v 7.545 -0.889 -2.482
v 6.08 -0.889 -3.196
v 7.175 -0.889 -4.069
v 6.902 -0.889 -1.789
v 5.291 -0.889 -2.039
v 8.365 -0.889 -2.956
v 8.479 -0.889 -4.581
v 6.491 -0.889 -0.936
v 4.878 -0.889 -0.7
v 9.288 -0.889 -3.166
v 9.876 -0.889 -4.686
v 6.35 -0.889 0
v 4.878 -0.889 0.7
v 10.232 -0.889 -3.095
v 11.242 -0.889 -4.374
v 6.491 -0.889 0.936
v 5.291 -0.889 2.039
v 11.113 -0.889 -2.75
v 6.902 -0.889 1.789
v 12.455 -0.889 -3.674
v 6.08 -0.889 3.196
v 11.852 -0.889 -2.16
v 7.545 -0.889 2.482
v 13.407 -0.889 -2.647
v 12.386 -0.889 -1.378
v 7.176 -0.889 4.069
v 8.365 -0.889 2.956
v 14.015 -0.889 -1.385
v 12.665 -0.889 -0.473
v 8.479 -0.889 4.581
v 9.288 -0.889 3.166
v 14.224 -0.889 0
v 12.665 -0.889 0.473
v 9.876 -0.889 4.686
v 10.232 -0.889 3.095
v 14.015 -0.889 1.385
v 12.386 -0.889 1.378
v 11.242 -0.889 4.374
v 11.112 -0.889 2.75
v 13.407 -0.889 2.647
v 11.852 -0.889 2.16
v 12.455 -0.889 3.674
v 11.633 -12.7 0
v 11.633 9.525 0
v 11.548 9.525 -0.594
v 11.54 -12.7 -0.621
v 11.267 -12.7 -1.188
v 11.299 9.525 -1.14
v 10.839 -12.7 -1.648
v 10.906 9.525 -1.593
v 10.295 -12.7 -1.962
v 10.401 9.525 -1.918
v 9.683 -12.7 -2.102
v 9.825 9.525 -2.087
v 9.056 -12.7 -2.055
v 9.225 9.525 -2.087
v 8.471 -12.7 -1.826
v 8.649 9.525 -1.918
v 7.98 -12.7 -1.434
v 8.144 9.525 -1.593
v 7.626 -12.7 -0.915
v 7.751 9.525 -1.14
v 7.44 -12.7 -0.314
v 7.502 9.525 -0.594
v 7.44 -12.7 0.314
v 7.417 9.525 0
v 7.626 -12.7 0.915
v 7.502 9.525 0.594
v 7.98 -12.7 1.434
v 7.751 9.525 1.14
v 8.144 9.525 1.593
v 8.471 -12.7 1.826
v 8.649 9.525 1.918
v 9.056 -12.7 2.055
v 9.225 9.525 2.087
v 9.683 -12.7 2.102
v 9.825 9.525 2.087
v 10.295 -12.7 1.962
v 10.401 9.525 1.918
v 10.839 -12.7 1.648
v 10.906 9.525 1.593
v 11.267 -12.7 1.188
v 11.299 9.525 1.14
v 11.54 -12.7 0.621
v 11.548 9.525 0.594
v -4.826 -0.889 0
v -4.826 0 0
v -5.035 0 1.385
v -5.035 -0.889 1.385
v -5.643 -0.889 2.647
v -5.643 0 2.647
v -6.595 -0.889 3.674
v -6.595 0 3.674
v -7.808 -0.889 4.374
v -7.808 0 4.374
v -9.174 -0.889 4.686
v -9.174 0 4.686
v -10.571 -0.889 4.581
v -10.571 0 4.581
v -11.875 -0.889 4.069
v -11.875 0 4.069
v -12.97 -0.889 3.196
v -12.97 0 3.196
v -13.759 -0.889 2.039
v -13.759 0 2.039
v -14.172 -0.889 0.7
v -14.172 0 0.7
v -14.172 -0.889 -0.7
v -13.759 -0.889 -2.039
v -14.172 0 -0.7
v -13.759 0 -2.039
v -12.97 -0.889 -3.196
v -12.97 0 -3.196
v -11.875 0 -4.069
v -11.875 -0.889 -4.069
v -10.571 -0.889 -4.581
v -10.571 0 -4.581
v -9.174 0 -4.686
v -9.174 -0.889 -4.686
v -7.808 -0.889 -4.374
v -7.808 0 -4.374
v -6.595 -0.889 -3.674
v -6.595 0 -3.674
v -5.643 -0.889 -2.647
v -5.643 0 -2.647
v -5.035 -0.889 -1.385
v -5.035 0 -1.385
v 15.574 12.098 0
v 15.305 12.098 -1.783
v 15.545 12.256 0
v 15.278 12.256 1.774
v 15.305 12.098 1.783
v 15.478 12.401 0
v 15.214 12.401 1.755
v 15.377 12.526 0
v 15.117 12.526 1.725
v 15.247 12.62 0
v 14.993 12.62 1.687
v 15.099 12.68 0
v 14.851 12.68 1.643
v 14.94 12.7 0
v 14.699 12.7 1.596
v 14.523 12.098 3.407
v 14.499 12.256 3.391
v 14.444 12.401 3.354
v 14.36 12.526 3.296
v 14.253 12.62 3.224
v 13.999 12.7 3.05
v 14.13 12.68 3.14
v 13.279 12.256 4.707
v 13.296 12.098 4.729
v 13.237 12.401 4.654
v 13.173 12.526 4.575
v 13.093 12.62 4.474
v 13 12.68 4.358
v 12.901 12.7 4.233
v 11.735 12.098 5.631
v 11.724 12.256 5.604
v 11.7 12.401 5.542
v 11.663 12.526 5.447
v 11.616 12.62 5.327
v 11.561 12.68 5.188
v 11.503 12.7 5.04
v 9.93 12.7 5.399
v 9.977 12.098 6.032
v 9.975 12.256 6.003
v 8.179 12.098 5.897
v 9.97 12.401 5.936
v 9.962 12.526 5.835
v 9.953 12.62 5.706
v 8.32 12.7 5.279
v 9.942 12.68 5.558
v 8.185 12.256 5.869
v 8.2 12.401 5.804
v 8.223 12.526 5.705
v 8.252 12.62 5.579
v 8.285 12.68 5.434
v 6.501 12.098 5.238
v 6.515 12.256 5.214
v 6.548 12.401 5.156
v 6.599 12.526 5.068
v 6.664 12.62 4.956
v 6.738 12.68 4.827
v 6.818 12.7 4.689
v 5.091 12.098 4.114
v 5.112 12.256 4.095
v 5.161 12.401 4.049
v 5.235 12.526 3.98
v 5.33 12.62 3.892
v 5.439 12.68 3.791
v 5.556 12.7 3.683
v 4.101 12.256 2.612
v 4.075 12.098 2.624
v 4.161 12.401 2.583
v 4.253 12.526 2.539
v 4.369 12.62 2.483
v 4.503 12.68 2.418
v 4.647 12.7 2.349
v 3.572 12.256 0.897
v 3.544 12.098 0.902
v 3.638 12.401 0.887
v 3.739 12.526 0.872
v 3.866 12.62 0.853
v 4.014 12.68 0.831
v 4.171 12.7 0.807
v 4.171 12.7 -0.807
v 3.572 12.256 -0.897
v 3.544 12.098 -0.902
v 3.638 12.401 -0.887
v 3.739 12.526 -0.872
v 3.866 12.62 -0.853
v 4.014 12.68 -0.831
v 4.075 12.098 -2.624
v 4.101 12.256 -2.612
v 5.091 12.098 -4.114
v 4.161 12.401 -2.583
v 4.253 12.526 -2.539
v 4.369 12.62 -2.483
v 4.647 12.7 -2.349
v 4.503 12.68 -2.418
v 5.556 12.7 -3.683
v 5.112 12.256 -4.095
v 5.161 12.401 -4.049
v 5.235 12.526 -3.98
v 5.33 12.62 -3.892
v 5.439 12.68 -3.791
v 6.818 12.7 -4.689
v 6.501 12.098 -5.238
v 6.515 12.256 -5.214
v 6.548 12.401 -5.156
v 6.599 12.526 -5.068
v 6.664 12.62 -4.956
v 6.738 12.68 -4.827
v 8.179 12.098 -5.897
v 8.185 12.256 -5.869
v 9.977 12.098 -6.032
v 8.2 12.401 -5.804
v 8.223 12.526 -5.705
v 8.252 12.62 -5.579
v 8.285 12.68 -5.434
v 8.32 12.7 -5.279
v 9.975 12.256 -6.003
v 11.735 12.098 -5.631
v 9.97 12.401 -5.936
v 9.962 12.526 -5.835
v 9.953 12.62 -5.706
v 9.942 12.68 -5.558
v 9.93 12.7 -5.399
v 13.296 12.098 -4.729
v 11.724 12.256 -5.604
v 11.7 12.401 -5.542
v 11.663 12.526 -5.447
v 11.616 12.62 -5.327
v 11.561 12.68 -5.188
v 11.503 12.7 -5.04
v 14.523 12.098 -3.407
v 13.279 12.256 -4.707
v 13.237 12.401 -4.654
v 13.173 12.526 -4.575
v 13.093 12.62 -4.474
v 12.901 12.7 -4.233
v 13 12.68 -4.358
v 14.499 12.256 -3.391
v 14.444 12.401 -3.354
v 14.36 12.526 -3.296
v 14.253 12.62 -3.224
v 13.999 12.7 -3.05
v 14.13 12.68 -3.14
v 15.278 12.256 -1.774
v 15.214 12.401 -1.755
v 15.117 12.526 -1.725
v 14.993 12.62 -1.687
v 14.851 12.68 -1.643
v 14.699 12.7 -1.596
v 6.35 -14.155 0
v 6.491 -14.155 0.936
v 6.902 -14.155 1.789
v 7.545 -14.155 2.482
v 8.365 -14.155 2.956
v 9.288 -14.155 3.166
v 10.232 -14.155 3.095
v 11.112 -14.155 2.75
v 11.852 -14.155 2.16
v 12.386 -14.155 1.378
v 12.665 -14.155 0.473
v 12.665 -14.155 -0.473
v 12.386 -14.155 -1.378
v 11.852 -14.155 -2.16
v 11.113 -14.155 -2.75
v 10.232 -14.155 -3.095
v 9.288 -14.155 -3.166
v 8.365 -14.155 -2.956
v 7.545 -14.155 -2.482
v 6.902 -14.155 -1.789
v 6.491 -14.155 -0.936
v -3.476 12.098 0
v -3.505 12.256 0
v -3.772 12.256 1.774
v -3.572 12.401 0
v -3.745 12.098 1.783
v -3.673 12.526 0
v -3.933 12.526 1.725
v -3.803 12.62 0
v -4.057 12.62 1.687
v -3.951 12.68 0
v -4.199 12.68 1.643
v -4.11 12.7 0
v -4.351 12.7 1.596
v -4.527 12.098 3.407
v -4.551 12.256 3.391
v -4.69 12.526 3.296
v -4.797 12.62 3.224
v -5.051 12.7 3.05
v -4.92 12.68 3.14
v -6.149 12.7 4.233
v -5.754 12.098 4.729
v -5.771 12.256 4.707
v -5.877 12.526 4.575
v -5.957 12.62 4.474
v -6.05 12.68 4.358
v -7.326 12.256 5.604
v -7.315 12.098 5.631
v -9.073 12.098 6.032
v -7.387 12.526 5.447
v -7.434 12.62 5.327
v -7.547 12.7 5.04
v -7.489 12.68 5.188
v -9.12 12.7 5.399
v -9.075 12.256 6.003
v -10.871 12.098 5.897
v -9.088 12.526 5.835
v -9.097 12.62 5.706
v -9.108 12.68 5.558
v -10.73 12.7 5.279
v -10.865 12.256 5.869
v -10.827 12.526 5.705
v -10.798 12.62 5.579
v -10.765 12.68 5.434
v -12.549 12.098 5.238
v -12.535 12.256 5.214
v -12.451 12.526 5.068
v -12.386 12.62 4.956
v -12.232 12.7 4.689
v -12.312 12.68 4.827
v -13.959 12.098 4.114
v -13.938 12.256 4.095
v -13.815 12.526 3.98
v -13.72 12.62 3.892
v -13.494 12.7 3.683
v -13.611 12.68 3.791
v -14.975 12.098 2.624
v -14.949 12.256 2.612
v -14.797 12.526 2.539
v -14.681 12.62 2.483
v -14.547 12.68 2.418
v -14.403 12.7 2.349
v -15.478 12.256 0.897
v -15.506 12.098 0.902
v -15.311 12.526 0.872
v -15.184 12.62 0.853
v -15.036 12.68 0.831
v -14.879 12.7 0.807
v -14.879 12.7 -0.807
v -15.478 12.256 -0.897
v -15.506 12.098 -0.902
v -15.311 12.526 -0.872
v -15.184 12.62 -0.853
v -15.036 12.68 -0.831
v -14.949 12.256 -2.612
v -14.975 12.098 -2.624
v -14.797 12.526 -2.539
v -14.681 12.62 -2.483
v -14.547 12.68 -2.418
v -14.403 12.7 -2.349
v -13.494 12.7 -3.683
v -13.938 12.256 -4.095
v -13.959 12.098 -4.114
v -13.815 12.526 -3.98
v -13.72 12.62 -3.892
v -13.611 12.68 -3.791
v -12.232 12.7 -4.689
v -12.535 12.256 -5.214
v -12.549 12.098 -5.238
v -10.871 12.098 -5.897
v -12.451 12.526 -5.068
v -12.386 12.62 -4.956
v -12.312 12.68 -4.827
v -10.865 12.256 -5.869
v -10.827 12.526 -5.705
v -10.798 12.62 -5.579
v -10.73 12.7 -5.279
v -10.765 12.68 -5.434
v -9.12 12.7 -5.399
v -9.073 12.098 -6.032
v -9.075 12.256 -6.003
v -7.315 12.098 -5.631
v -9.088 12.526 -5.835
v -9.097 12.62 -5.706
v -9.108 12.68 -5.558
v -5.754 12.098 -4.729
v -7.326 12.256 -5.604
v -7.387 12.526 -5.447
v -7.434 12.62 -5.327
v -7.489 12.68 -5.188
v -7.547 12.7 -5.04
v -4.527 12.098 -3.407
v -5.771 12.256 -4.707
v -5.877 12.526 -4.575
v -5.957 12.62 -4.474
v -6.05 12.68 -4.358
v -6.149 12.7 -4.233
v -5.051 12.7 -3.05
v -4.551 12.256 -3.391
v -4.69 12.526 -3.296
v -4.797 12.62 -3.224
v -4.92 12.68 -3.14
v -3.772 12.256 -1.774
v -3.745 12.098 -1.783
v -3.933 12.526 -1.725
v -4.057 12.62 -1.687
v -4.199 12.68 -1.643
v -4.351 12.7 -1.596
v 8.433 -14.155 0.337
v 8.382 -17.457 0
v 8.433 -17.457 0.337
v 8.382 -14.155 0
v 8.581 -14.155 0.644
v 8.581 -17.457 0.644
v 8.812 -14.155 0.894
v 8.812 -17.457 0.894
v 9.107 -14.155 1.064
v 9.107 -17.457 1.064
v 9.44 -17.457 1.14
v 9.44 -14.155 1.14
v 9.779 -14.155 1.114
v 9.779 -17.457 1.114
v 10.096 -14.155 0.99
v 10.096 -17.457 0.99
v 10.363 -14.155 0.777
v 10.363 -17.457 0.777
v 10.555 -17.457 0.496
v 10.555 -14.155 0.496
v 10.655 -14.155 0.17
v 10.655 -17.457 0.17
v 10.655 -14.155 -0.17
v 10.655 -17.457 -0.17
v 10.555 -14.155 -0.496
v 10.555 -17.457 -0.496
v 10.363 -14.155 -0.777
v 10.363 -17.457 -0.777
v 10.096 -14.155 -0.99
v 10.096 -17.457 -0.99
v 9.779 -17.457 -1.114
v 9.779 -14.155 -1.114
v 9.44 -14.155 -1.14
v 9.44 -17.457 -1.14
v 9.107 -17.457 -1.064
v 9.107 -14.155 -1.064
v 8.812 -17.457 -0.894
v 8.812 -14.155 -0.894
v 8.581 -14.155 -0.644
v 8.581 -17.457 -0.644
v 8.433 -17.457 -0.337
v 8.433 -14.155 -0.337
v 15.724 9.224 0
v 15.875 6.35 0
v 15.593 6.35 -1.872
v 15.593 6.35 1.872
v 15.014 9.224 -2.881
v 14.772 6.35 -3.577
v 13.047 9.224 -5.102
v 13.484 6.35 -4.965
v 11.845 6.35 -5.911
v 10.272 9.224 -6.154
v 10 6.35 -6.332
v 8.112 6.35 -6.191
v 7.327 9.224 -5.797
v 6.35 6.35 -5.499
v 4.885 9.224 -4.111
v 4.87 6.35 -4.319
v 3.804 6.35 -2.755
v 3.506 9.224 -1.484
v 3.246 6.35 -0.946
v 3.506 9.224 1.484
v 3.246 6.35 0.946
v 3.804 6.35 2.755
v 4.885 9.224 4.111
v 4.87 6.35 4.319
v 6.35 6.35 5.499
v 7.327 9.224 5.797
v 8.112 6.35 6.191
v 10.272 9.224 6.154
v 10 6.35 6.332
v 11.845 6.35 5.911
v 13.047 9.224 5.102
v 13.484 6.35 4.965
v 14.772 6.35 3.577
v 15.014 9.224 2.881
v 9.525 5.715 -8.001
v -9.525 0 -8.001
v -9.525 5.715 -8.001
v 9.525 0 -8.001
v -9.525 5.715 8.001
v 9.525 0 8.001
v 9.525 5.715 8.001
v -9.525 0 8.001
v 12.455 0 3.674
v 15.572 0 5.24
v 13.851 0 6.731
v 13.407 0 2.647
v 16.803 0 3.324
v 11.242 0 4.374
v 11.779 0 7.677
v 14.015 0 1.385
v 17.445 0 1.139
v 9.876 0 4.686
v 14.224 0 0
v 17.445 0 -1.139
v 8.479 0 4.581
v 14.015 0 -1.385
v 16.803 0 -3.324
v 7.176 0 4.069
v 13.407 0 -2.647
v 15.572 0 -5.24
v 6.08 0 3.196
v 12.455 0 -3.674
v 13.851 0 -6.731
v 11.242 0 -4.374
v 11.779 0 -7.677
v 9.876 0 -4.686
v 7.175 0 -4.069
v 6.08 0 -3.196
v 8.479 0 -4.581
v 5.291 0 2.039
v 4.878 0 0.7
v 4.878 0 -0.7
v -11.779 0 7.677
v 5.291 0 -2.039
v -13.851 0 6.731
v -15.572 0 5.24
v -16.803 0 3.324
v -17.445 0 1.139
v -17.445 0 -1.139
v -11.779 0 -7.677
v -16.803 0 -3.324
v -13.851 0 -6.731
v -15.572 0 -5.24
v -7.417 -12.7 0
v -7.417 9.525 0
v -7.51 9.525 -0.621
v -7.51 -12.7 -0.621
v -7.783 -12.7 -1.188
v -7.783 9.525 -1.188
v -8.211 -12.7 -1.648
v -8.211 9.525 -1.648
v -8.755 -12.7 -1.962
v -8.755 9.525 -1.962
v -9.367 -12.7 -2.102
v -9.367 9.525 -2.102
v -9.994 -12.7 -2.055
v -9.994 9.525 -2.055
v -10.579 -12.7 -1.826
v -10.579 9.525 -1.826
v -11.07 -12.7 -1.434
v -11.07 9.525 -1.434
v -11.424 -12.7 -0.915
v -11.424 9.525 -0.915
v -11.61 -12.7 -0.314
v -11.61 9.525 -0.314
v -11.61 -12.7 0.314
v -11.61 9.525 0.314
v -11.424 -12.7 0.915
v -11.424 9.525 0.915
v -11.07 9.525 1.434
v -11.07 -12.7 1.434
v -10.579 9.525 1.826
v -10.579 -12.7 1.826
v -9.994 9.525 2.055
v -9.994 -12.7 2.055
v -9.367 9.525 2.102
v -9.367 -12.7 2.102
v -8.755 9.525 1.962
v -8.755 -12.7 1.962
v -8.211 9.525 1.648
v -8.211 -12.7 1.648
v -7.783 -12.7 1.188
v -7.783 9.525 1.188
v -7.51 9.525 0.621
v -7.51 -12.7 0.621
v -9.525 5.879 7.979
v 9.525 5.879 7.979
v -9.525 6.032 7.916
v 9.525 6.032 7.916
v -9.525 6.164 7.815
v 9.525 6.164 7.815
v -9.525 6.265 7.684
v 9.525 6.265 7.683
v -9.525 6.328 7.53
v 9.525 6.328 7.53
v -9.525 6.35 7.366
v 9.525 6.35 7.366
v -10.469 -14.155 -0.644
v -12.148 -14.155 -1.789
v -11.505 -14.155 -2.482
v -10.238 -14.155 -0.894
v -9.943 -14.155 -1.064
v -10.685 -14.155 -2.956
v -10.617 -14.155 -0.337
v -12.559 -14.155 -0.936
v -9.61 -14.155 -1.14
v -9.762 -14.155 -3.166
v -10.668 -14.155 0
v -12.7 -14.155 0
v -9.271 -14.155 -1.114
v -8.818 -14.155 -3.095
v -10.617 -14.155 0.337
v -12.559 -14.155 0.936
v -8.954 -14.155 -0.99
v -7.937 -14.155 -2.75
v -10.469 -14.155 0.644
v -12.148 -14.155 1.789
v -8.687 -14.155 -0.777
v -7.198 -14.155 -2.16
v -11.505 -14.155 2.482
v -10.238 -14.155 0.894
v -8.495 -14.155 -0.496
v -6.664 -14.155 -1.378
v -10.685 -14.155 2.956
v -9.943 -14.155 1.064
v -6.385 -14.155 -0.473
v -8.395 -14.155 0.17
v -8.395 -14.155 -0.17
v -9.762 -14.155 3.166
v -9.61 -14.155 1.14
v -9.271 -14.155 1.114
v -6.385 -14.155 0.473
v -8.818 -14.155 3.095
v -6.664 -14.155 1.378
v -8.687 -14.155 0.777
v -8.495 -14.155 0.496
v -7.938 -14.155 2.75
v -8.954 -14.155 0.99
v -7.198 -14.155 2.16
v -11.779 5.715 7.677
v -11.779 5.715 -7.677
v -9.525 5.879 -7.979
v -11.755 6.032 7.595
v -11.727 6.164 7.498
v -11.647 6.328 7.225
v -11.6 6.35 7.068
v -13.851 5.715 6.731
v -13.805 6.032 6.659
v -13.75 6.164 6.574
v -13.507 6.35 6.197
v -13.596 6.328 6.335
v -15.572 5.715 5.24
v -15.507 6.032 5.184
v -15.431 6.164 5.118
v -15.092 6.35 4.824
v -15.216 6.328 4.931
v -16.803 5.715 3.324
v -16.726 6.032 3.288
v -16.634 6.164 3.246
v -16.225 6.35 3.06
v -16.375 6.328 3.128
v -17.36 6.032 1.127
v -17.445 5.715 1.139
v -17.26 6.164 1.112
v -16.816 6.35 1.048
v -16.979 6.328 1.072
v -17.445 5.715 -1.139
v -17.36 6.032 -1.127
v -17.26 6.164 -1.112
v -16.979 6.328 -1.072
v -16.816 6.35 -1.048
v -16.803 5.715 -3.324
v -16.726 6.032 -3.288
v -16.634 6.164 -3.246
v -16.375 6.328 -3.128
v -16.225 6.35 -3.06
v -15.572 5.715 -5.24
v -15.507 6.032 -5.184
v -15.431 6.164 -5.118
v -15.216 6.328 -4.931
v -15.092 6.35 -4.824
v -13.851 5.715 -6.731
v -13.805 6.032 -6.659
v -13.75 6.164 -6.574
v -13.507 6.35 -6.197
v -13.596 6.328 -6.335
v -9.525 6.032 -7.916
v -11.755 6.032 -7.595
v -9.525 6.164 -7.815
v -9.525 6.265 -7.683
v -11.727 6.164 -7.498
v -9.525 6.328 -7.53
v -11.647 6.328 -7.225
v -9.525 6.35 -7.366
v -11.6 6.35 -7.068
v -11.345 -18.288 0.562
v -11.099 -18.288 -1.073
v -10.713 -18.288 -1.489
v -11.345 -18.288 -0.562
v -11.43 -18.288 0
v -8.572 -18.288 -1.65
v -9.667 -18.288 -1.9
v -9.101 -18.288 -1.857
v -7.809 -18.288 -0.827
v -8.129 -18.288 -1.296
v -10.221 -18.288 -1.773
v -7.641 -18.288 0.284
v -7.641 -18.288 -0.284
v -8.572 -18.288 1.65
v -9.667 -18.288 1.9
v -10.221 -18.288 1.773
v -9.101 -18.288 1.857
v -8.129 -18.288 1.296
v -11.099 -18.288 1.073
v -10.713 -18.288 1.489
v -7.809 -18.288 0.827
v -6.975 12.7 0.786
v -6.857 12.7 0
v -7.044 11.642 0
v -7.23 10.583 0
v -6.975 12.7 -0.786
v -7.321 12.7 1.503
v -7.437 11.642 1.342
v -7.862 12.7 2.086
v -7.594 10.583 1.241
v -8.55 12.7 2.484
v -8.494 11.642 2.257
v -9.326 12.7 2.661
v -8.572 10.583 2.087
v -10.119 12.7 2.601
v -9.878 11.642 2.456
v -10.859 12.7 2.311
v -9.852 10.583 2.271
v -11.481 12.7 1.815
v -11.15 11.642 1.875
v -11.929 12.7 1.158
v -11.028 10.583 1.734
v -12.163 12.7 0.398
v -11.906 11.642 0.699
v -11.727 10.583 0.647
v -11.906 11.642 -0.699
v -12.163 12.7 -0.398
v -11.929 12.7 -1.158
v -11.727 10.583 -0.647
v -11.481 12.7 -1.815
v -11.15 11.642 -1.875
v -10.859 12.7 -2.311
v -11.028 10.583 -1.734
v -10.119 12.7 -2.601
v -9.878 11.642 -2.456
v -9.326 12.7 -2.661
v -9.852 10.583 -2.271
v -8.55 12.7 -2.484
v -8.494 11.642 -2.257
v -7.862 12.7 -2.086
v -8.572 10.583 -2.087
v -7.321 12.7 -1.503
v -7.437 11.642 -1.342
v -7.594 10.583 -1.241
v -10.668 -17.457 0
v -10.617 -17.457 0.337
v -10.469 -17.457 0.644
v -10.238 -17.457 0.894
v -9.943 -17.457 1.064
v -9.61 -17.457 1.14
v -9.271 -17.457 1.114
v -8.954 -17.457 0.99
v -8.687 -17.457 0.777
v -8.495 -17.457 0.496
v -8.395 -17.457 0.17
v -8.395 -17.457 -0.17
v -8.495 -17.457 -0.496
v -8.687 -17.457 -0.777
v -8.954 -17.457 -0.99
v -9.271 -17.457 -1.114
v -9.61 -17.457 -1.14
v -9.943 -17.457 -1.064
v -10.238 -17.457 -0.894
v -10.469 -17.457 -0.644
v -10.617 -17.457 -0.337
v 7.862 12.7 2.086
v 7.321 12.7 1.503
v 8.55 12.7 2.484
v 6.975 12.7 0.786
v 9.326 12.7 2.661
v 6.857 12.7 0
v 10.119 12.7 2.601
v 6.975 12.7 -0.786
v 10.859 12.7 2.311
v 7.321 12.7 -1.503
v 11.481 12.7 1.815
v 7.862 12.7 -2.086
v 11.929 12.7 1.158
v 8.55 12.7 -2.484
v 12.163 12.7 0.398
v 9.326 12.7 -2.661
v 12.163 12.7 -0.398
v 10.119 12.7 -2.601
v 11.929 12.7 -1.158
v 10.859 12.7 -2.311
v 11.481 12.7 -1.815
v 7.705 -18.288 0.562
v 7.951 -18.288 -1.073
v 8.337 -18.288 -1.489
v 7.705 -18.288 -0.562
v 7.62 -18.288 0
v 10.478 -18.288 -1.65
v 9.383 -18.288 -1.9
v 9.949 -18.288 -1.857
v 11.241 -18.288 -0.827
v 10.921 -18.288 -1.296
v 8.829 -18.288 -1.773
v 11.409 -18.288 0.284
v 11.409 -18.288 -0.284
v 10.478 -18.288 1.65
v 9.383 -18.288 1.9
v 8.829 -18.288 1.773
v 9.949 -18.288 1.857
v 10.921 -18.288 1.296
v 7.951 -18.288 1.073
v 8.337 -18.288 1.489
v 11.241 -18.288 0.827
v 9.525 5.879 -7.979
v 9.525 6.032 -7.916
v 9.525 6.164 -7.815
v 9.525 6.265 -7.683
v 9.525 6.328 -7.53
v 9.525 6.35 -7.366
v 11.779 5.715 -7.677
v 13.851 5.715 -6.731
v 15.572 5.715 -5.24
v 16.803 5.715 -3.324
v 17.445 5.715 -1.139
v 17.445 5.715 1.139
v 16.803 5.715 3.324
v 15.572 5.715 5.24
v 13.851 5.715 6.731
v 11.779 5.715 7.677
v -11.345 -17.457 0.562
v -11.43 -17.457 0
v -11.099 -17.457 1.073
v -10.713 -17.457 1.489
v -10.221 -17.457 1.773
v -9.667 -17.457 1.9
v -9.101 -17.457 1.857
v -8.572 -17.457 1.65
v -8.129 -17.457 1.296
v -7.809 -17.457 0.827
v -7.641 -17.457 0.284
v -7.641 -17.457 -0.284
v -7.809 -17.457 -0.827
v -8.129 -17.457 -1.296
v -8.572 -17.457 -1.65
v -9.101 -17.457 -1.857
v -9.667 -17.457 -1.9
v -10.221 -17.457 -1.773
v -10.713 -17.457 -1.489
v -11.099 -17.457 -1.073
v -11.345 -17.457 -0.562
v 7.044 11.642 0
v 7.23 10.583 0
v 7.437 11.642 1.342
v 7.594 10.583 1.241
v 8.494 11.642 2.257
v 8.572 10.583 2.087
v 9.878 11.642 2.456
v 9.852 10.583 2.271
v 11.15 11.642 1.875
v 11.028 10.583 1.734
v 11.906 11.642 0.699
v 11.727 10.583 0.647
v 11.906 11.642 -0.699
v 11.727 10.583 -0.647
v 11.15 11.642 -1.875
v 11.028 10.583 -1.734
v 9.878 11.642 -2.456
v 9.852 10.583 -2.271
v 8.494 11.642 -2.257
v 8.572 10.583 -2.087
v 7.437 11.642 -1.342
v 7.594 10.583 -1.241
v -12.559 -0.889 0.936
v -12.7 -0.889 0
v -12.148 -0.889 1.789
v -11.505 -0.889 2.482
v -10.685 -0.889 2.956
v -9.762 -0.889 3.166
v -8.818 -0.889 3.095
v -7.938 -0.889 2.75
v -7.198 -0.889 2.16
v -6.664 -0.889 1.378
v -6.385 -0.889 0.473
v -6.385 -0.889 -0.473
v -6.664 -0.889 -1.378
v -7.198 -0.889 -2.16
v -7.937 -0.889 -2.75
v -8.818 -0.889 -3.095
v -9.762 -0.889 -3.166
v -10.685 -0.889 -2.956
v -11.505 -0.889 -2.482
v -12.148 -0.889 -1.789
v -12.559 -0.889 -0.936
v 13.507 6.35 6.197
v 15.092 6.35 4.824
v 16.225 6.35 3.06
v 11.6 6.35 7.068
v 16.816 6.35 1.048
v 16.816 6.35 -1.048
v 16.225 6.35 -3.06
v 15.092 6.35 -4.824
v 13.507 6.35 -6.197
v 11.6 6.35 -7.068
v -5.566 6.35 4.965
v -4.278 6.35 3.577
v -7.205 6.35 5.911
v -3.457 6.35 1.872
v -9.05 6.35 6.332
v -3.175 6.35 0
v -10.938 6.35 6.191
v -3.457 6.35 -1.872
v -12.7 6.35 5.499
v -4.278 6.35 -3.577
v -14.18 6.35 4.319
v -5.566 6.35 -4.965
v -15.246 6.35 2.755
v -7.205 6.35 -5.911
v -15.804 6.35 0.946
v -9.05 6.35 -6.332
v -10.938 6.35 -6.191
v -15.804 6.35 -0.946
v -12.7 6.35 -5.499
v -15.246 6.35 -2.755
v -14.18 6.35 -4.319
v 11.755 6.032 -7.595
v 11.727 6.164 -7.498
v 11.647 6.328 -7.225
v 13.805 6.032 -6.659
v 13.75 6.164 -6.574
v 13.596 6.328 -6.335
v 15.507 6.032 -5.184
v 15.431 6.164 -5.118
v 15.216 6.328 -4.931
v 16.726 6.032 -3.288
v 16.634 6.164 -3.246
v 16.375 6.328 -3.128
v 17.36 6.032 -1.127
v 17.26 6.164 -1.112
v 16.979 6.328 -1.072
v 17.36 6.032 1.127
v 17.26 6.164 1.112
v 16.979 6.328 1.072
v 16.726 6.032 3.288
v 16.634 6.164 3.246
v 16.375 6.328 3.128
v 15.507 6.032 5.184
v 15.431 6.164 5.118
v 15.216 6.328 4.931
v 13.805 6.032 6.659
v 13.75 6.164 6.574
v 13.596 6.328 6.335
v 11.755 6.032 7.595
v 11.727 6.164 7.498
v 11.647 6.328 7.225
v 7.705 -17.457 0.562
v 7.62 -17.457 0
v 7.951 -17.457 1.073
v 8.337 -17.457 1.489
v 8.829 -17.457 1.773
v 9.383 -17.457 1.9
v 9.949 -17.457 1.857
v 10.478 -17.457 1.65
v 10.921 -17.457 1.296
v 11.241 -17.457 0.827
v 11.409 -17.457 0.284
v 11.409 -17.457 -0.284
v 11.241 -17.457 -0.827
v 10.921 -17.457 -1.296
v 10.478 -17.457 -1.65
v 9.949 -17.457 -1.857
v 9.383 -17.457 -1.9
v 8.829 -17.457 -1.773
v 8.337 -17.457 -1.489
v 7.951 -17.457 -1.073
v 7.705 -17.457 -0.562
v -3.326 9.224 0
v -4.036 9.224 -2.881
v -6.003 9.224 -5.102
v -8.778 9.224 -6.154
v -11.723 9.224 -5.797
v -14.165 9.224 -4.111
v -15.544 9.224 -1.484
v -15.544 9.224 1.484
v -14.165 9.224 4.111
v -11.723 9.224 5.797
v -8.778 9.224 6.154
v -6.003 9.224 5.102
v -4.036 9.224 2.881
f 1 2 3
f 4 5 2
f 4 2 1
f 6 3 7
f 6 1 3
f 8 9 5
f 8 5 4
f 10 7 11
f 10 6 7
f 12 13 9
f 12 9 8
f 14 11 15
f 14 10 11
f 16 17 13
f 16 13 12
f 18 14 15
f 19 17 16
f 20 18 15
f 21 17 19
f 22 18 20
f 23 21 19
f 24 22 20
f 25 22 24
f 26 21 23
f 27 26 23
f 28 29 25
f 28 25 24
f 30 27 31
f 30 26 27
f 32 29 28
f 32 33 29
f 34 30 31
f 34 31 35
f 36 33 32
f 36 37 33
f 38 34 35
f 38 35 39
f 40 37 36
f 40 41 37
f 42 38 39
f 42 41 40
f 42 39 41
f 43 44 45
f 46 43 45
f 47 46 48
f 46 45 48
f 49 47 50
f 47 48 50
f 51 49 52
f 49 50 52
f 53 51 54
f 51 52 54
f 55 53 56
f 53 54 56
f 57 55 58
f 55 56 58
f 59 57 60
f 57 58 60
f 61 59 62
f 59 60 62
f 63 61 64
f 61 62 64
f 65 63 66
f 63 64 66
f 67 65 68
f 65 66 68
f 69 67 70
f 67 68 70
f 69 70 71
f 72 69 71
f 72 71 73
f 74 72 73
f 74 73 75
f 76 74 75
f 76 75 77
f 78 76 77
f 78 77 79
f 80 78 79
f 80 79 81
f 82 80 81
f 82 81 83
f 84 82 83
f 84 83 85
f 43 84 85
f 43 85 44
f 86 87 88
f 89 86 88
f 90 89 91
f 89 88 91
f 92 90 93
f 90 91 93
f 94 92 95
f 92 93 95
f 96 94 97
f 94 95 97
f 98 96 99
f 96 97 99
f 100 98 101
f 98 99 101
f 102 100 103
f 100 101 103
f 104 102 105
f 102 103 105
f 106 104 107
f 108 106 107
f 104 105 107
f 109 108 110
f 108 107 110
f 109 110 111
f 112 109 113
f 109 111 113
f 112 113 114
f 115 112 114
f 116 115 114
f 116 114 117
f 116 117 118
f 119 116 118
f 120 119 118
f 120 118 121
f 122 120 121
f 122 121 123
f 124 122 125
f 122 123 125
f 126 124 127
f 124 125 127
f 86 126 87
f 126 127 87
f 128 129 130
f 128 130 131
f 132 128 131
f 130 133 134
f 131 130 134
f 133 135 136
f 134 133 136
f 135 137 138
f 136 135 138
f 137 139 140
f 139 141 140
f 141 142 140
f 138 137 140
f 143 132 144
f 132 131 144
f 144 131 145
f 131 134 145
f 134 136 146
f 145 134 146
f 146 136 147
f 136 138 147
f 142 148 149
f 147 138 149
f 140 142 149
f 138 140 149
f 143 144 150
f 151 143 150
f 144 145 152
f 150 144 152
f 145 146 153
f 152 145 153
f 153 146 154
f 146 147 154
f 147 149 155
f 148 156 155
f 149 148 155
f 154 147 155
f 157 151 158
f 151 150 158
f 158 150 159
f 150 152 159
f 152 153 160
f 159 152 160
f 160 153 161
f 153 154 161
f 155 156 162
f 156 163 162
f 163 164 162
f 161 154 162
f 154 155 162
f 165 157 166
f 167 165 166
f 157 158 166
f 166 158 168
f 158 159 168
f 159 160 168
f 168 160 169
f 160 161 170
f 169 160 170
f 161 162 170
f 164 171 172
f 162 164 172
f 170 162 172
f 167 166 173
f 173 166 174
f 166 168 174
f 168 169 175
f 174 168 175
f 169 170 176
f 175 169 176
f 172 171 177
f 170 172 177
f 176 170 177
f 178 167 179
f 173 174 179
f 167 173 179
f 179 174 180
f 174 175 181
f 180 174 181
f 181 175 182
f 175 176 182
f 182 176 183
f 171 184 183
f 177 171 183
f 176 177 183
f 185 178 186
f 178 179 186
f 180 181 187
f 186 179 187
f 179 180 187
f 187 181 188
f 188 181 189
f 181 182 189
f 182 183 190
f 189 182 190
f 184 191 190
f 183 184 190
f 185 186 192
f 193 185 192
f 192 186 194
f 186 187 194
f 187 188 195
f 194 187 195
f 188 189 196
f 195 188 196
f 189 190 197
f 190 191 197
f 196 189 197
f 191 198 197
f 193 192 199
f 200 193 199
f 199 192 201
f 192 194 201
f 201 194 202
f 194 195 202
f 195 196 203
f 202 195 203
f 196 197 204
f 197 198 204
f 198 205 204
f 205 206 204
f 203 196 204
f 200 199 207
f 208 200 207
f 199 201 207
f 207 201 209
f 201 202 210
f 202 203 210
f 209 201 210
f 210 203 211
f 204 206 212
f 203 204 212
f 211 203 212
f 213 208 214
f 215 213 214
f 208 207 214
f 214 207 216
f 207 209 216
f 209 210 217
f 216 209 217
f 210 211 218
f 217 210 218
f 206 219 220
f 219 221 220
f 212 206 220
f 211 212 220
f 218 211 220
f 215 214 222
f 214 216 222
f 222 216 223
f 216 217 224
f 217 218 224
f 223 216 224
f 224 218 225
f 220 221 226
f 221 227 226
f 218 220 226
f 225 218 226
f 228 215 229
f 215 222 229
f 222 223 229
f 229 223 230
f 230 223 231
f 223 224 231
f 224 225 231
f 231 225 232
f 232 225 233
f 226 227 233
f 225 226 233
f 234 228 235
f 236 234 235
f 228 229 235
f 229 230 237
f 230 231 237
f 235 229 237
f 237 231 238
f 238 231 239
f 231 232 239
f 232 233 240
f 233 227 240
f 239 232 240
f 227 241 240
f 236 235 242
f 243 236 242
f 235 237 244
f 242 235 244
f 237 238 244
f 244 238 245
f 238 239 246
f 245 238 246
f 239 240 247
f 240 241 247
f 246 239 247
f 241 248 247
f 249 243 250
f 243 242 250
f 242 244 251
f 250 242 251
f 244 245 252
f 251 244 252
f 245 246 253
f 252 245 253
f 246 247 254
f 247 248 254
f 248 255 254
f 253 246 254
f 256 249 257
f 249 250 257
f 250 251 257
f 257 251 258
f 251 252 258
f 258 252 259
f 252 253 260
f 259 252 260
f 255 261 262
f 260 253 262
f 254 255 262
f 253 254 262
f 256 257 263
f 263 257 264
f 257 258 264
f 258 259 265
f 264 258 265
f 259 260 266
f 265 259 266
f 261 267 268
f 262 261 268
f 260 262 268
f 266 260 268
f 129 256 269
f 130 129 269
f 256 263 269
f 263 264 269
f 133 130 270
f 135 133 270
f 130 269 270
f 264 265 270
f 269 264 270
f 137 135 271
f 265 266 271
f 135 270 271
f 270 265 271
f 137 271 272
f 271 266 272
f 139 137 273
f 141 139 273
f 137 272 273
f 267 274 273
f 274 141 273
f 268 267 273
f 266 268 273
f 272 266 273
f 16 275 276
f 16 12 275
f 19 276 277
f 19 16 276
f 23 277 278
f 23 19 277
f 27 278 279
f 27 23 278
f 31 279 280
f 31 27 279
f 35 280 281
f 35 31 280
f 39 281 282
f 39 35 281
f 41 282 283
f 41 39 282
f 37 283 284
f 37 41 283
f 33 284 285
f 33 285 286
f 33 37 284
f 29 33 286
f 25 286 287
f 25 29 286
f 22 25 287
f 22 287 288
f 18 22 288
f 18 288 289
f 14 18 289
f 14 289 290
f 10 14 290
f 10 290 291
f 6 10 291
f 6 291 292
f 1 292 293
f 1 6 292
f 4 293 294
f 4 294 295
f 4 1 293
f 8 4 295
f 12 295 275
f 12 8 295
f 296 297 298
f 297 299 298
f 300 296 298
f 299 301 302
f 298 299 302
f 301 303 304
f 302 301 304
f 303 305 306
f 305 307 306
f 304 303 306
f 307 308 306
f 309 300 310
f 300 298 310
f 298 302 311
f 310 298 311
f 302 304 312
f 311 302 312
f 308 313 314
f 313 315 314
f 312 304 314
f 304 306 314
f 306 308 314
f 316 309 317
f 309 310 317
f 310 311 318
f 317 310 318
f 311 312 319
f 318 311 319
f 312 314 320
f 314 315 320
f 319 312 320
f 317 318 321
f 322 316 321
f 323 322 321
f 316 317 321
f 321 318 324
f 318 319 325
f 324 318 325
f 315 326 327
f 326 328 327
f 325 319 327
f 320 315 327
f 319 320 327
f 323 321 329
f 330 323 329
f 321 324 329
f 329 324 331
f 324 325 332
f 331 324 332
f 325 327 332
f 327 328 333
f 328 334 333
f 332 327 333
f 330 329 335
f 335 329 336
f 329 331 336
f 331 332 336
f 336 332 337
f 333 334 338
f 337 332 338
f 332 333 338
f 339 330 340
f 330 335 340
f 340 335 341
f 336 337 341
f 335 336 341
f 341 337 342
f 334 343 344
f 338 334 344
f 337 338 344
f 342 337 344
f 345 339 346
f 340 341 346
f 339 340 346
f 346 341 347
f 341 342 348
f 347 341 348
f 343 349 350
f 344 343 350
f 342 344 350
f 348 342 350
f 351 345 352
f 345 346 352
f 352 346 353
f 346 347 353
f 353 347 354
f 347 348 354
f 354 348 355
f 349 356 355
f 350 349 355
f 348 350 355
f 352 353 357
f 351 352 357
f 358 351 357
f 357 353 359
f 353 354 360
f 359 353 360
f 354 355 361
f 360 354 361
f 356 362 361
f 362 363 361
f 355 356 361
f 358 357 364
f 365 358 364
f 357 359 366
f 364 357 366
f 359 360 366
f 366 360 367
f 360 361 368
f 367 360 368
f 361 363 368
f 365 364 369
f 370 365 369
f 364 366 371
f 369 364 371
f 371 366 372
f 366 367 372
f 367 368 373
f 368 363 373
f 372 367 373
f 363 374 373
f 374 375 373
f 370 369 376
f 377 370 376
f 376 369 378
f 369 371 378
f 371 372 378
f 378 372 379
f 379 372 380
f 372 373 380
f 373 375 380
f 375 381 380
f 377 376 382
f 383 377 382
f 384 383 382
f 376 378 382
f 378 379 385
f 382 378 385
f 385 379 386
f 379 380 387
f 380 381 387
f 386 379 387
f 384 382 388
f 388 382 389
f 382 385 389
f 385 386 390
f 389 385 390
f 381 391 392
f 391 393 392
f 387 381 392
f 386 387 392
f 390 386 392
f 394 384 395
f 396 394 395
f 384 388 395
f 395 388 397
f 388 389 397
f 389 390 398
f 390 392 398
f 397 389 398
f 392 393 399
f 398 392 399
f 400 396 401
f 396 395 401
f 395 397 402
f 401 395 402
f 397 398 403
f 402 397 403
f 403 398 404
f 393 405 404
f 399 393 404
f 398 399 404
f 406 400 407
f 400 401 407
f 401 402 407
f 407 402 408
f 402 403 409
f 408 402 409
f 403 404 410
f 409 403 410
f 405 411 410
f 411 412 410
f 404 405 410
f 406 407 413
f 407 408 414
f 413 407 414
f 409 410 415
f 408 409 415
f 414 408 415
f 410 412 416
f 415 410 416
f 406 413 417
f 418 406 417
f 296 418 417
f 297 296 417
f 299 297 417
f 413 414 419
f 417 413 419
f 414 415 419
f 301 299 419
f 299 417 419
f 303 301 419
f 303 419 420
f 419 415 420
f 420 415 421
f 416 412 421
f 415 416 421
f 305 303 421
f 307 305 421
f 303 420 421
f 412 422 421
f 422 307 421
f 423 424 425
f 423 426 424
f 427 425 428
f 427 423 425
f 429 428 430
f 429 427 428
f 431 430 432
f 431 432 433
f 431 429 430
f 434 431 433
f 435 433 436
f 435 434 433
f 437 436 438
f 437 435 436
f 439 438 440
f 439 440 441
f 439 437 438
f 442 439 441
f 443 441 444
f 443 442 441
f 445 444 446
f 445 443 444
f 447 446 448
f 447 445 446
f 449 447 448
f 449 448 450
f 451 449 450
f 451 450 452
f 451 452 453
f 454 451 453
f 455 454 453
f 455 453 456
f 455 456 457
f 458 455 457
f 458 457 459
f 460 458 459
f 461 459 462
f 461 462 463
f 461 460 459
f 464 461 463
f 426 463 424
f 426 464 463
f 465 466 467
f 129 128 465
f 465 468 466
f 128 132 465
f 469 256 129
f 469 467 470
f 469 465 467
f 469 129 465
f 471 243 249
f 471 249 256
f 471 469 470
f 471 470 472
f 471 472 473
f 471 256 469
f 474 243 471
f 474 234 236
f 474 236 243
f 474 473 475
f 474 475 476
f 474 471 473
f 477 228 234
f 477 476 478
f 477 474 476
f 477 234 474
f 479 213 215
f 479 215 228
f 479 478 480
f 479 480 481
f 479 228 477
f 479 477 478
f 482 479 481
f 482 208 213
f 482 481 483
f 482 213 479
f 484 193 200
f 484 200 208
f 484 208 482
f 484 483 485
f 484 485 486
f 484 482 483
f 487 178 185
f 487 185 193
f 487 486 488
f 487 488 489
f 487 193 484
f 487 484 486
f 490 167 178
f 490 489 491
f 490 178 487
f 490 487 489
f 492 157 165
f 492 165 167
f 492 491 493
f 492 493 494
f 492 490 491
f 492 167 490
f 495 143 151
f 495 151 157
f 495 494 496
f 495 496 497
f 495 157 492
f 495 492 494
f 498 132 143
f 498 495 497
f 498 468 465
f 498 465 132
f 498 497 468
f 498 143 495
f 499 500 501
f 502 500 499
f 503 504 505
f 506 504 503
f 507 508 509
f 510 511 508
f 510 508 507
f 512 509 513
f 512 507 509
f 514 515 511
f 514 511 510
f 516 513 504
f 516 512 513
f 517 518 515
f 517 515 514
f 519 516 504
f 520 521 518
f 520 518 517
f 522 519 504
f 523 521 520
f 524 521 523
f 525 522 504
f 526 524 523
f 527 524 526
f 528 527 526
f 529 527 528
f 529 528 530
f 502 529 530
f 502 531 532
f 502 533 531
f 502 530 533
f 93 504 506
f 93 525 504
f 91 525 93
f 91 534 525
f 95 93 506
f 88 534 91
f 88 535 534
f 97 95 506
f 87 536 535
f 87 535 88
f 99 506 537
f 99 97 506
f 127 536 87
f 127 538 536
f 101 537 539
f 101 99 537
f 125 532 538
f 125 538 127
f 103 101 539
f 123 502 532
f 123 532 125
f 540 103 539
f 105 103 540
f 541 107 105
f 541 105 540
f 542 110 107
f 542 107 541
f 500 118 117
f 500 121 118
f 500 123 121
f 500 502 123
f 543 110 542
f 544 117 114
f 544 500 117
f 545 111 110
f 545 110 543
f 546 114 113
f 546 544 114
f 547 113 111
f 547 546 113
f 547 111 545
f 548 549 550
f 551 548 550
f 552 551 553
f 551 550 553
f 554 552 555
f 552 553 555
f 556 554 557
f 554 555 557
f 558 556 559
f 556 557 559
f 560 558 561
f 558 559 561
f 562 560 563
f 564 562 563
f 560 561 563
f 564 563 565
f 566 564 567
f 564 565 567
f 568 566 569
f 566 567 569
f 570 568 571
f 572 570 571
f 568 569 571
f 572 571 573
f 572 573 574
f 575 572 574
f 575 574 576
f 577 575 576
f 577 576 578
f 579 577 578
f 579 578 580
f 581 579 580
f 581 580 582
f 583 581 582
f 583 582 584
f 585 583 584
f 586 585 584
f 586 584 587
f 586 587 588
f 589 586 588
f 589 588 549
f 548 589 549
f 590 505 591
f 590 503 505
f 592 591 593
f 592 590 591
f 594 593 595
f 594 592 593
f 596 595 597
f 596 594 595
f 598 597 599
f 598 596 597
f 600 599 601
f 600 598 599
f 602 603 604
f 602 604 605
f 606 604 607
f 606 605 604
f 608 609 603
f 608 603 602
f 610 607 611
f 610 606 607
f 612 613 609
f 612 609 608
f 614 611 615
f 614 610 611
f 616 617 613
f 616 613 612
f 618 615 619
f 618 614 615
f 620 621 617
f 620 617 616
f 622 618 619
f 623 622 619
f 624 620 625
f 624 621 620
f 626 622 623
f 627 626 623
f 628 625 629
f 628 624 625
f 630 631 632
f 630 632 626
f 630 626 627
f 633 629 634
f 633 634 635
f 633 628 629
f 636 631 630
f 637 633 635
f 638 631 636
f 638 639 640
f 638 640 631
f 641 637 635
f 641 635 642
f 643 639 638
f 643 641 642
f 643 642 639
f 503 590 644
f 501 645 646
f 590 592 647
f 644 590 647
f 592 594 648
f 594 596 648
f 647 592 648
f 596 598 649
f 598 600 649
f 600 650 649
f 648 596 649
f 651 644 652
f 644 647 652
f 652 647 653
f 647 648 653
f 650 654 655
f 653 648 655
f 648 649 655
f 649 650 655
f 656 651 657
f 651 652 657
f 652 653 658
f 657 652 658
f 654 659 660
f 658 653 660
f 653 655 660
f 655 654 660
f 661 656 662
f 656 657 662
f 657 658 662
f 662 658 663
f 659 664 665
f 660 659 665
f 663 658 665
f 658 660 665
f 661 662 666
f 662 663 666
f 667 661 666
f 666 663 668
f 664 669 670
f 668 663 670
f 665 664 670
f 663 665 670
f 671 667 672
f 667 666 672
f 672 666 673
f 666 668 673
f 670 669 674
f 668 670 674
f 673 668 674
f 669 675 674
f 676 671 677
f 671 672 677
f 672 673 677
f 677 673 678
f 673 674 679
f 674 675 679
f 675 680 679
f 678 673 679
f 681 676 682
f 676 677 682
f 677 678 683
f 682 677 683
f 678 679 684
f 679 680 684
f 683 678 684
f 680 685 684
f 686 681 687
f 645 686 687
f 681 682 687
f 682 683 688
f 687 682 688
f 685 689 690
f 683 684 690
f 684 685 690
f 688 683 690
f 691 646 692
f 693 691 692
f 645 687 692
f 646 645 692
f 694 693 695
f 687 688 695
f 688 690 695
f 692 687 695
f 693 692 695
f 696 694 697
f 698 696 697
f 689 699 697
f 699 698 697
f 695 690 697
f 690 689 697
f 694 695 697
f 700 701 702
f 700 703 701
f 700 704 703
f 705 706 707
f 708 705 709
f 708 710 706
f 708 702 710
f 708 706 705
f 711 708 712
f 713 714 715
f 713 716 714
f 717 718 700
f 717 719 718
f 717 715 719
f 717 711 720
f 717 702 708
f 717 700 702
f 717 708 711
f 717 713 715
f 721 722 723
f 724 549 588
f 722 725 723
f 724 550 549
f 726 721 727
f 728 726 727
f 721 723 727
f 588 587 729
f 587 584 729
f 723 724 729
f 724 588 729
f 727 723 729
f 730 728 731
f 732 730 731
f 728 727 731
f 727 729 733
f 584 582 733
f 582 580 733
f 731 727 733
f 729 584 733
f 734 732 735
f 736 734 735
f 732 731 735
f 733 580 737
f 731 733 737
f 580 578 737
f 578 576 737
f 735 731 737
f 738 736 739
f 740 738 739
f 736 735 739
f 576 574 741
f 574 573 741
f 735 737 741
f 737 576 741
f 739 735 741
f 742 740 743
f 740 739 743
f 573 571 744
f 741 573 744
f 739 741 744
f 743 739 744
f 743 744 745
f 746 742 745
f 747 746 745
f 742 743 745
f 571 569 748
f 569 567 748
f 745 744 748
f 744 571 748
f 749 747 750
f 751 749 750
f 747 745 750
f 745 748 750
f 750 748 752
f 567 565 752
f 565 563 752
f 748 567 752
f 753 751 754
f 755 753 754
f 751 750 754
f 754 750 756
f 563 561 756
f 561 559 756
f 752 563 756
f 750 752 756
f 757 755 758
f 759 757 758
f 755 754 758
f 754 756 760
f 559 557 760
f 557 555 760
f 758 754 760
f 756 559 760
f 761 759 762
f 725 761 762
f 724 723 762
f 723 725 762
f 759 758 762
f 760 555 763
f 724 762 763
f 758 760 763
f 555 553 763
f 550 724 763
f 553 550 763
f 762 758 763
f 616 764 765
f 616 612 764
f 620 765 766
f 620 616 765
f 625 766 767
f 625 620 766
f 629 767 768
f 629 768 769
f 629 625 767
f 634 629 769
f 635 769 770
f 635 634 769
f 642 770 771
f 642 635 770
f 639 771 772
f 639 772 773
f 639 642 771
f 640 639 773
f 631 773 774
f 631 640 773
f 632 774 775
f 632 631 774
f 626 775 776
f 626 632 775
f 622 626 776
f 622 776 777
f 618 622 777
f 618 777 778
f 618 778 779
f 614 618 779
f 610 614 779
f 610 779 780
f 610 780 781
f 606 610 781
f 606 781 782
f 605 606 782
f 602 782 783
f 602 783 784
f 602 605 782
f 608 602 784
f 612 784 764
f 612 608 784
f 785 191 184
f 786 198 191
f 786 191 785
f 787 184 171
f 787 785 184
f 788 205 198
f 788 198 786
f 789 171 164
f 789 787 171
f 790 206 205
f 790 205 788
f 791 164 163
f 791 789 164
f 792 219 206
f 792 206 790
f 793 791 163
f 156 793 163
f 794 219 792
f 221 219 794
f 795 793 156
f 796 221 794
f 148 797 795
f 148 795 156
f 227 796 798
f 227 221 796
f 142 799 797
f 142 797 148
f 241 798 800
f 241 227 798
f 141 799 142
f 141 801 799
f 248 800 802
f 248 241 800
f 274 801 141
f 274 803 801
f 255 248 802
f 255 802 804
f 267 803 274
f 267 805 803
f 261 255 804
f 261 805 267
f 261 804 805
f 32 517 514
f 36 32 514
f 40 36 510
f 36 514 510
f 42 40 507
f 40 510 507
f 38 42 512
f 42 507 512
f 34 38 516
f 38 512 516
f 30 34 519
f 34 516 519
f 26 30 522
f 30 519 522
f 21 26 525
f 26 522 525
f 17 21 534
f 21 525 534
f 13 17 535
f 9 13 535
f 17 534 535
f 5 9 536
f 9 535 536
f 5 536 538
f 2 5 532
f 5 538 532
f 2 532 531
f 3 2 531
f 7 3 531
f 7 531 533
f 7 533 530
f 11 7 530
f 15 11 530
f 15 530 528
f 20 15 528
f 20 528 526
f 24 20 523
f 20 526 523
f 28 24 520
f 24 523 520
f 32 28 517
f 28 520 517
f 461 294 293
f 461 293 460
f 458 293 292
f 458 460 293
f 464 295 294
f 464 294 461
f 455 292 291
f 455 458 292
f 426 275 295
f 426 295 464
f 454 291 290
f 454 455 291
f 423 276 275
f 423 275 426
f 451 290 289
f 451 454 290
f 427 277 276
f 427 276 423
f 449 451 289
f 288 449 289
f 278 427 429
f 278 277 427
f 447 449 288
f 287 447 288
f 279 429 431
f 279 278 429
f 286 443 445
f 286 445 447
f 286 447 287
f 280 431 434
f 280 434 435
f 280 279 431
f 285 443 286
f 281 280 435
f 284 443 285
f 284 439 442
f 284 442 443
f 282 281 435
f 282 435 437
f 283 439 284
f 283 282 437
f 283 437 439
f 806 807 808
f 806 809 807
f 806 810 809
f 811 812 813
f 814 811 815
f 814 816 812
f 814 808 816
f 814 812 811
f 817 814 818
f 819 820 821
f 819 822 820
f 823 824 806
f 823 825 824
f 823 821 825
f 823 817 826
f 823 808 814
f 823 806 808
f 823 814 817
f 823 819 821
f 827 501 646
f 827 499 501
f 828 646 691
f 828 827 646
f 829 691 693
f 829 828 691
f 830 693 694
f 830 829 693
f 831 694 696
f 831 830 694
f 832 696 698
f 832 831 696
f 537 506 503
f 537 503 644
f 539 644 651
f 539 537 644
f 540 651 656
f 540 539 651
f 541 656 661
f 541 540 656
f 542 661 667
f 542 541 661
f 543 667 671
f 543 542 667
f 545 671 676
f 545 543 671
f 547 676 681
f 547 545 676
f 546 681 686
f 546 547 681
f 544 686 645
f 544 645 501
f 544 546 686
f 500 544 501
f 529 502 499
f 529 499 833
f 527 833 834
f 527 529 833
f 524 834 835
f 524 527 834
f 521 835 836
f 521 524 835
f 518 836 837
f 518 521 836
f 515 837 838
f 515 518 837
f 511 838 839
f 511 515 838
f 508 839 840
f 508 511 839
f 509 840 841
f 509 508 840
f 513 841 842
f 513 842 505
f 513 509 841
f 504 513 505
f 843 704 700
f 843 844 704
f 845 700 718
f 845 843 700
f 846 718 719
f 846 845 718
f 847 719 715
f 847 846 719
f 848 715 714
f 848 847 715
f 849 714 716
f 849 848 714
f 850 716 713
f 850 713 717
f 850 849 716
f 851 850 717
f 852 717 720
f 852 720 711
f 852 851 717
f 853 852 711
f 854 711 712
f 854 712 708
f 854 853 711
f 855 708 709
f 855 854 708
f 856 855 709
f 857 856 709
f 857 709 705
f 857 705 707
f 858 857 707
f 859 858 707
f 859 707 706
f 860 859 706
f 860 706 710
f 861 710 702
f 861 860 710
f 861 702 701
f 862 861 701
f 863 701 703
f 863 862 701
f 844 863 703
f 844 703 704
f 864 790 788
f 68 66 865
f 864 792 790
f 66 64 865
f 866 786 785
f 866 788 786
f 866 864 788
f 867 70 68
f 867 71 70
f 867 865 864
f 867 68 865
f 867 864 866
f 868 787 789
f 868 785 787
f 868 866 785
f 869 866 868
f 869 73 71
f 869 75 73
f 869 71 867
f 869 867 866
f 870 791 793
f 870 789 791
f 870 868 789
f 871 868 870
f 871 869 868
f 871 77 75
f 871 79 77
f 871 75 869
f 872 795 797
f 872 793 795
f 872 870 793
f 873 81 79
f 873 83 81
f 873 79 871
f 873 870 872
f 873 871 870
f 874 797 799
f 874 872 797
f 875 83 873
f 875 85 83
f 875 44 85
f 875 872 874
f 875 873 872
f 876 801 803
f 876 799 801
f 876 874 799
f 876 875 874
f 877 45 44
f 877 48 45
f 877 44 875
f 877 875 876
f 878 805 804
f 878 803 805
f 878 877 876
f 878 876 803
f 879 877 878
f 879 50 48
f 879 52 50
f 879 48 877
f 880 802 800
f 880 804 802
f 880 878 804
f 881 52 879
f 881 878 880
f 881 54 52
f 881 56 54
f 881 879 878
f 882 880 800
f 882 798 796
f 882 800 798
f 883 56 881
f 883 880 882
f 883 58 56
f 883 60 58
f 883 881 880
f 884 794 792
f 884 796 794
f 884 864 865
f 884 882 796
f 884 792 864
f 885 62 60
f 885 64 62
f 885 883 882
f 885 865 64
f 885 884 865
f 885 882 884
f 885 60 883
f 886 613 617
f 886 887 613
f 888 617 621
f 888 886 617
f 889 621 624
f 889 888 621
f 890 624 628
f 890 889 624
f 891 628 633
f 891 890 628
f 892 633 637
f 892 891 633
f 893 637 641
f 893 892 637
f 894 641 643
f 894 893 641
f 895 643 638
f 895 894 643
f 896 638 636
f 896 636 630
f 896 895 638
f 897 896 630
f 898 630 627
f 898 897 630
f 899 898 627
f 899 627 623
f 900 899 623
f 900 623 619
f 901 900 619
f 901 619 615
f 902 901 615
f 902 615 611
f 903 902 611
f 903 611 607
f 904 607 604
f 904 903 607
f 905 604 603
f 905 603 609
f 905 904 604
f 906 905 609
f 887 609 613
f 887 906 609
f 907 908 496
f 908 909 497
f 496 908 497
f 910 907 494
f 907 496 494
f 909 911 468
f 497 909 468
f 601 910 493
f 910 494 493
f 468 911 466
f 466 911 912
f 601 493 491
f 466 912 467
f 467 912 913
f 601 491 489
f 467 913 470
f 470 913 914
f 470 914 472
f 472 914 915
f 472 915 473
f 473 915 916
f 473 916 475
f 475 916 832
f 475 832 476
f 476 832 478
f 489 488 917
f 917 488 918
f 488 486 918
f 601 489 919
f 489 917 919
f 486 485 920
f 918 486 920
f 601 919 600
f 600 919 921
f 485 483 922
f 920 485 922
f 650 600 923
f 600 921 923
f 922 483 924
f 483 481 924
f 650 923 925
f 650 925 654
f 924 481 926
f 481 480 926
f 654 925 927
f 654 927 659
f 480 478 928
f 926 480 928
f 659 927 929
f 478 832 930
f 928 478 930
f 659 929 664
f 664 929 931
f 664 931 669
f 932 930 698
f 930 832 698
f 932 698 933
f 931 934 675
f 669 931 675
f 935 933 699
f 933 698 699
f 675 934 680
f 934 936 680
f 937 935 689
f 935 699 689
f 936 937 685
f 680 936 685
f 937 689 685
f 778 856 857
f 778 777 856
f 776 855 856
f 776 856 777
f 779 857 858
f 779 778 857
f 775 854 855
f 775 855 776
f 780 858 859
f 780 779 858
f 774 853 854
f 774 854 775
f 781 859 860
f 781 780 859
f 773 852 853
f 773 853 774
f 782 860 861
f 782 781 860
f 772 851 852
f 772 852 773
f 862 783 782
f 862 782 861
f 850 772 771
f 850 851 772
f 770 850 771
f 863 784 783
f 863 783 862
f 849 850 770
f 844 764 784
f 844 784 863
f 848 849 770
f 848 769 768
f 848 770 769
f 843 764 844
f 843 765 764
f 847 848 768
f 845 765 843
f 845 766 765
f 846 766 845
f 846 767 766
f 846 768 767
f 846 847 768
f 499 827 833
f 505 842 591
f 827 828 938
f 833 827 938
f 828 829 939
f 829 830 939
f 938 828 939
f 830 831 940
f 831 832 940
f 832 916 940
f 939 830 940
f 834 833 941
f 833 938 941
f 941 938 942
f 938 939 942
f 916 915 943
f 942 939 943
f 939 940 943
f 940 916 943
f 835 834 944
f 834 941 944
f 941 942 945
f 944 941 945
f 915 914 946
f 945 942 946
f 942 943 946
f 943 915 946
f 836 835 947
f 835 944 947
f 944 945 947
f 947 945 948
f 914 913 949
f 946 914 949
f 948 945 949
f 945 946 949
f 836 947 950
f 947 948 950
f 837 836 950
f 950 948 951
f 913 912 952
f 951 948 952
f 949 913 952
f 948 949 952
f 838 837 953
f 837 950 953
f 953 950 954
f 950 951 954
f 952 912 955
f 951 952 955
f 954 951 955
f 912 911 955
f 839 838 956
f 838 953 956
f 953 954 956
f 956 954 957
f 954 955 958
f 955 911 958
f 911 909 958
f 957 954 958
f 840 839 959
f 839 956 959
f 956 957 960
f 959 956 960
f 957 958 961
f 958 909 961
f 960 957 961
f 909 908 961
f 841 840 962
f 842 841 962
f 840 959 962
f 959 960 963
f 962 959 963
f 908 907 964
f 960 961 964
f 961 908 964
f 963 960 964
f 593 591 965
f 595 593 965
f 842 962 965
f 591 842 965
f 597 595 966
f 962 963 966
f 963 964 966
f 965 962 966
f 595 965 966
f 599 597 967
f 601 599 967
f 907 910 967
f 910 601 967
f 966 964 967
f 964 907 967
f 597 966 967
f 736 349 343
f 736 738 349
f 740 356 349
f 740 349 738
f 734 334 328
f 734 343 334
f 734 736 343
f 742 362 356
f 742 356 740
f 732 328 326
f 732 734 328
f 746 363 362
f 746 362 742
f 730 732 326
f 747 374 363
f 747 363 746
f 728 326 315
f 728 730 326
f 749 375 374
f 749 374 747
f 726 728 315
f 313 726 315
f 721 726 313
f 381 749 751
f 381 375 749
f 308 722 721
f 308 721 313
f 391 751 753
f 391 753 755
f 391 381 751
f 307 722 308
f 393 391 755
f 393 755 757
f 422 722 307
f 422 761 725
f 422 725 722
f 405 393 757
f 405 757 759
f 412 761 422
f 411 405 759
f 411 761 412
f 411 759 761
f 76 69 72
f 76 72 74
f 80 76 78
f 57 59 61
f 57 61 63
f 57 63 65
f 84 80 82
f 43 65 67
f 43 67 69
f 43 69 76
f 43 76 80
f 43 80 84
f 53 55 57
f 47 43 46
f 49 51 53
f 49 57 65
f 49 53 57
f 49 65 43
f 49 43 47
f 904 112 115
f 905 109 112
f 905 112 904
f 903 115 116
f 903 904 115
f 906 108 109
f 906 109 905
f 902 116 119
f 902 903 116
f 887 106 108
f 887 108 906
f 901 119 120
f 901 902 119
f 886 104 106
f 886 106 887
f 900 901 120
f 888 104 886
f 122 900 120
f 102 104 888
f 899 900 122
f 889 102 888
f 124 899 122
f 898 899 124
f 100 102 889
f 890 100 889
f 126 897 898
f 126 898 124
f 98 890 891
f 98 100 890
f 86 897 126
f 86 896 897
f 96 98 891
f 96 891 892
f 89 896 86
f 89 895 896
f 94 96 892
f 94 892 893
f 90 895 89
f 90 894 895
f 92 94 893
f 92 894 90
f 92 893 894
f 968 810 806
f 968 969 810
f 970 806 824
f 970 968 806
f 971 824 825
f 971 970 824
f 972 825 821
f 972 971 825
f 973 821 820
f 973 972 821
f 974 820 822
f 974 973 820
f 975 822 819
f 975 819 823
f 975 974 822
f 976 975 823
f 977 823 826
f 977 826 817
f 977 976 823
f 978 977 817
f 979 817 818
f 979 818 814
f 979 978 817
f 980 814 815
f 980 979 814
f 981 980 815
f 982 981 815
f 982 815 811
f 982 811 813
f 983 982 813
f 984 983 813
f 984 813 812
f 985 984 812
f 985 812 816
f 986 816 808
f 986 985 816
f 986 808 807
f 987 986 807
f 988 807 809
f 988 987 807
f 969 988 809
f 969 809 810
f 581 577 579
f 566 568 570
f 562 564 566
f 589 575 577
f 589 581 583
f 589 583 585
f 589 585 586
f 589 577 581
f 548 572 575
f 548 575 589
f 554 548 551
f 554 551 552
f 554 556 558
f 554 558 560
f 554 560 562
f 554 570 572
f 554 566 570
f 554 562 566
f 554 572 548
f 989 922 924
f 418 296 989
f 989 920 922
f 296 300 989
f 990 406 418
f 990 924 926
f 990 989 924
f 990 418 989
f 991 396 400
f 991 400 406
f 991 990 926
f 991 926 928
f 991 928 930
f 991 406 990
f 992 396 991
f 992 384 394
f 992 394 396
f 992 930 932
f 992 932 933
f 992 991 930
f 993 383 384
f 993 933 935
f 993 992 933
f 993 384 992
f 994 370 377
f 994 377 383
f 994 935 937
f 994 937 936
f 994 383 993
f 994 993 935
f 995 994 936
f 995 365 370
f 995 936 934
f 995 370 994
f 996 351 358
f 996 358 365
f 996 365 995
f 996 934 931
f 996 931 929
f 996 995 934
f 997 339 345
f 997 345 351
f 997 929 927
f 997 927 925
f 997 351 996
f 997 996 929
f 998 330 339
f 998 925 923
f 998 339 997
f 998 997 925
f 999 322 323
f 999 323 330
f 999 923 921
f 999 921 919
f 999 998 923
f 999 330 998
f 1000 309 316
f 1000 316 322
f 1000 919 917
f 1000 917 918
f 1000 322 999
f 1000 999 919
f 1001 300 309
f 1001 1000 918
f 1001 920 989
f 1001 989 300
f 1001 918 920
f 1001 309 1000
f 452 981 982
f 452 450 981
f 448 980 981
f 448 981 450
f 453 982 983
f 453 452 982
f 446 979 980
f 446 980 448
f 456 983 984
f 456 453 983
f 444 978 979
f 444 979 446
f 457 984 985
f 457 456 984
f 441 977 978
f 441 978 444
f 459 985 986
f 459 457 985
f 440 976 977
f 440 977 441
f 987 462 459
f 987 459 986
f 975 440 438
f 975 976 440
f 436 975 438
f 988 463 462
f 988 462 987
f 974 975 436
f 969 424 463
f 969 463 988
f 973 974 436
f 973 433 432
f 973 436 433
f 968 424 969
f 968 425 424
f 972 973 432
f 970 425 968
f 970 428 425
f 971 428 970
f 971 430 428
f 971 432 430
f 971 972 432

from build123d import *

# Parameters (mm, degrees)
BOSS_EXTRUDE1_DEPTH = 6.35
SKETCH2_R           = 6.35
BOSS_EXTRUDE2_DEPTH = 6.35
BOSS_EXTRUDE2_TAPER = 3
SKETCH3_R           = 4.699
BOSS_EXTRUDE3_DEPTH = 0.889
LPATTERN1_COUNT     = 2
LPATTERN1_PITCH     = 19.05
FILLET1_R           = 0.635
SKETCH5_R           = 2.1082
CUT_EXTRUDE1_DEPTH  = 25.4


with BuildPart() as part:
    # Sketch1 → Boss-Extrude1 (new body)
    with BuildSketch(Plane(origin=(0, 0, 0), x_dir=(1, 0, 0), z_dir=(0, 1, 0))):
        with BuildLine():
            Line((-9.525, 8.001), (9.525, 8.001))
            ThreePointArc((9.525, 8.001), (17.526, 0), (9.525, -8.001))
            Line((9.525, -8.001), (-9.525, -8.001))
            ThreePointArc((-9.525, -8.001), (-17.526, 0), (-9.525, 8.001))
        make_face()
    extrude(amount=BOSS_EXTRUDE1_DEPTH)

    # Sketch2 → Boss-Extrude2 (add)
    with BuildSketch(Plane(origin=(0, 6.35, 0), x_dir=(1, 0, 0), z_dir=(0, 1, 0))):
        with Locations((-9.525, 0)):
            Circle(SKETCH2_R)
        with Locations((9.525, 0)):
            Circle(SKETCH2_R)
    extrude(amount=BOSS_EXTRUDE2_DEPTH, taper=BOSS_EXTRUDE2_TAPER)

    # Sketch3 → Boss-Extrude3 (add)
    with BuildSketch(Plane.XZ):
        with Locations((-9.525, 0)):
            Circle(SKETCH3_R)
        with Locations((9.525, 0)):
            Circle(SKETCH3_R)
    extrude(amount=BOSS_EXTRUDE3_DEPTH)

    # Sketch4 → Revolve1 (revolve)
    with BuildSketch(Plane.XY):
        Polygon((9.525, -0.889), (9.525, -18.288), (7.62, -18.288), (7.62, -17.456876592), (8.382, -17.456876592), (8.382, -14.154876592), (6.35, -14.154876592), (6.35, -0.889), align=None)
    revolve1 = revolve(axis=Axis((9.525, -0.889, 0), (0, 1, 0)))

    # LPattern1: Revolve1 ×2
    with Locations(*[(-i * LPATTERN1_PITCH, 0, 0) for i in range(1, LPATTERN1_COUNT)]):
        add(revolve1)

    # Fillet1
    fillet1_edges = [part.edges().sort_by_distance(p)[0] for p in [
        (17.526, 6.35, 0),
        (0, 6.35, -8.001),
        (-15.542210602, 12.7, 0),
        (3.507789398, 12.7, 0),
        (-17.526, 6.35, 0),
        (0, 6.35, 8.001),
    ]]
    fillet(fillet1_edges, radius=FILLET1_R)

    # Sketch5 → Cut-Extrude1 (cut)
    with BuildSketch(Plane(origin=(0, 12.7, 0), x_dir=(1, 0, 0), z_dir=(0, 1, 0))):
        with Locations((-9.525, 0)):
            Circle(SKETCH5_R)
        with Locations((9.525, 0)):
            Circle(SKETCH5_R)
    extrude(amount=-CUT_EXTRUDE1_DEPTH, mode=Mode.SUBTRACT)

    # Sketch6 → flare (revolve, cut)
    with BuildSketch(Plane.XY):
        Polygon((6.409091305, 15.24), (7.4168, 9.525), (8.424508695, 15.24), align=None)
    flare = revolve(axis=Axis((9.525, -12.7, 0), (0, 1, 0)), mode=Mode.SUBTRACT)

    # Mirror1: flare across plane
    add(flare.mirror(Plane(origin=(0, 0, 0), x_dir=(0, 0, 1), z_dir=(1, 0, 0))), mode=Mode.SUBTRACT)


solid = part.part
